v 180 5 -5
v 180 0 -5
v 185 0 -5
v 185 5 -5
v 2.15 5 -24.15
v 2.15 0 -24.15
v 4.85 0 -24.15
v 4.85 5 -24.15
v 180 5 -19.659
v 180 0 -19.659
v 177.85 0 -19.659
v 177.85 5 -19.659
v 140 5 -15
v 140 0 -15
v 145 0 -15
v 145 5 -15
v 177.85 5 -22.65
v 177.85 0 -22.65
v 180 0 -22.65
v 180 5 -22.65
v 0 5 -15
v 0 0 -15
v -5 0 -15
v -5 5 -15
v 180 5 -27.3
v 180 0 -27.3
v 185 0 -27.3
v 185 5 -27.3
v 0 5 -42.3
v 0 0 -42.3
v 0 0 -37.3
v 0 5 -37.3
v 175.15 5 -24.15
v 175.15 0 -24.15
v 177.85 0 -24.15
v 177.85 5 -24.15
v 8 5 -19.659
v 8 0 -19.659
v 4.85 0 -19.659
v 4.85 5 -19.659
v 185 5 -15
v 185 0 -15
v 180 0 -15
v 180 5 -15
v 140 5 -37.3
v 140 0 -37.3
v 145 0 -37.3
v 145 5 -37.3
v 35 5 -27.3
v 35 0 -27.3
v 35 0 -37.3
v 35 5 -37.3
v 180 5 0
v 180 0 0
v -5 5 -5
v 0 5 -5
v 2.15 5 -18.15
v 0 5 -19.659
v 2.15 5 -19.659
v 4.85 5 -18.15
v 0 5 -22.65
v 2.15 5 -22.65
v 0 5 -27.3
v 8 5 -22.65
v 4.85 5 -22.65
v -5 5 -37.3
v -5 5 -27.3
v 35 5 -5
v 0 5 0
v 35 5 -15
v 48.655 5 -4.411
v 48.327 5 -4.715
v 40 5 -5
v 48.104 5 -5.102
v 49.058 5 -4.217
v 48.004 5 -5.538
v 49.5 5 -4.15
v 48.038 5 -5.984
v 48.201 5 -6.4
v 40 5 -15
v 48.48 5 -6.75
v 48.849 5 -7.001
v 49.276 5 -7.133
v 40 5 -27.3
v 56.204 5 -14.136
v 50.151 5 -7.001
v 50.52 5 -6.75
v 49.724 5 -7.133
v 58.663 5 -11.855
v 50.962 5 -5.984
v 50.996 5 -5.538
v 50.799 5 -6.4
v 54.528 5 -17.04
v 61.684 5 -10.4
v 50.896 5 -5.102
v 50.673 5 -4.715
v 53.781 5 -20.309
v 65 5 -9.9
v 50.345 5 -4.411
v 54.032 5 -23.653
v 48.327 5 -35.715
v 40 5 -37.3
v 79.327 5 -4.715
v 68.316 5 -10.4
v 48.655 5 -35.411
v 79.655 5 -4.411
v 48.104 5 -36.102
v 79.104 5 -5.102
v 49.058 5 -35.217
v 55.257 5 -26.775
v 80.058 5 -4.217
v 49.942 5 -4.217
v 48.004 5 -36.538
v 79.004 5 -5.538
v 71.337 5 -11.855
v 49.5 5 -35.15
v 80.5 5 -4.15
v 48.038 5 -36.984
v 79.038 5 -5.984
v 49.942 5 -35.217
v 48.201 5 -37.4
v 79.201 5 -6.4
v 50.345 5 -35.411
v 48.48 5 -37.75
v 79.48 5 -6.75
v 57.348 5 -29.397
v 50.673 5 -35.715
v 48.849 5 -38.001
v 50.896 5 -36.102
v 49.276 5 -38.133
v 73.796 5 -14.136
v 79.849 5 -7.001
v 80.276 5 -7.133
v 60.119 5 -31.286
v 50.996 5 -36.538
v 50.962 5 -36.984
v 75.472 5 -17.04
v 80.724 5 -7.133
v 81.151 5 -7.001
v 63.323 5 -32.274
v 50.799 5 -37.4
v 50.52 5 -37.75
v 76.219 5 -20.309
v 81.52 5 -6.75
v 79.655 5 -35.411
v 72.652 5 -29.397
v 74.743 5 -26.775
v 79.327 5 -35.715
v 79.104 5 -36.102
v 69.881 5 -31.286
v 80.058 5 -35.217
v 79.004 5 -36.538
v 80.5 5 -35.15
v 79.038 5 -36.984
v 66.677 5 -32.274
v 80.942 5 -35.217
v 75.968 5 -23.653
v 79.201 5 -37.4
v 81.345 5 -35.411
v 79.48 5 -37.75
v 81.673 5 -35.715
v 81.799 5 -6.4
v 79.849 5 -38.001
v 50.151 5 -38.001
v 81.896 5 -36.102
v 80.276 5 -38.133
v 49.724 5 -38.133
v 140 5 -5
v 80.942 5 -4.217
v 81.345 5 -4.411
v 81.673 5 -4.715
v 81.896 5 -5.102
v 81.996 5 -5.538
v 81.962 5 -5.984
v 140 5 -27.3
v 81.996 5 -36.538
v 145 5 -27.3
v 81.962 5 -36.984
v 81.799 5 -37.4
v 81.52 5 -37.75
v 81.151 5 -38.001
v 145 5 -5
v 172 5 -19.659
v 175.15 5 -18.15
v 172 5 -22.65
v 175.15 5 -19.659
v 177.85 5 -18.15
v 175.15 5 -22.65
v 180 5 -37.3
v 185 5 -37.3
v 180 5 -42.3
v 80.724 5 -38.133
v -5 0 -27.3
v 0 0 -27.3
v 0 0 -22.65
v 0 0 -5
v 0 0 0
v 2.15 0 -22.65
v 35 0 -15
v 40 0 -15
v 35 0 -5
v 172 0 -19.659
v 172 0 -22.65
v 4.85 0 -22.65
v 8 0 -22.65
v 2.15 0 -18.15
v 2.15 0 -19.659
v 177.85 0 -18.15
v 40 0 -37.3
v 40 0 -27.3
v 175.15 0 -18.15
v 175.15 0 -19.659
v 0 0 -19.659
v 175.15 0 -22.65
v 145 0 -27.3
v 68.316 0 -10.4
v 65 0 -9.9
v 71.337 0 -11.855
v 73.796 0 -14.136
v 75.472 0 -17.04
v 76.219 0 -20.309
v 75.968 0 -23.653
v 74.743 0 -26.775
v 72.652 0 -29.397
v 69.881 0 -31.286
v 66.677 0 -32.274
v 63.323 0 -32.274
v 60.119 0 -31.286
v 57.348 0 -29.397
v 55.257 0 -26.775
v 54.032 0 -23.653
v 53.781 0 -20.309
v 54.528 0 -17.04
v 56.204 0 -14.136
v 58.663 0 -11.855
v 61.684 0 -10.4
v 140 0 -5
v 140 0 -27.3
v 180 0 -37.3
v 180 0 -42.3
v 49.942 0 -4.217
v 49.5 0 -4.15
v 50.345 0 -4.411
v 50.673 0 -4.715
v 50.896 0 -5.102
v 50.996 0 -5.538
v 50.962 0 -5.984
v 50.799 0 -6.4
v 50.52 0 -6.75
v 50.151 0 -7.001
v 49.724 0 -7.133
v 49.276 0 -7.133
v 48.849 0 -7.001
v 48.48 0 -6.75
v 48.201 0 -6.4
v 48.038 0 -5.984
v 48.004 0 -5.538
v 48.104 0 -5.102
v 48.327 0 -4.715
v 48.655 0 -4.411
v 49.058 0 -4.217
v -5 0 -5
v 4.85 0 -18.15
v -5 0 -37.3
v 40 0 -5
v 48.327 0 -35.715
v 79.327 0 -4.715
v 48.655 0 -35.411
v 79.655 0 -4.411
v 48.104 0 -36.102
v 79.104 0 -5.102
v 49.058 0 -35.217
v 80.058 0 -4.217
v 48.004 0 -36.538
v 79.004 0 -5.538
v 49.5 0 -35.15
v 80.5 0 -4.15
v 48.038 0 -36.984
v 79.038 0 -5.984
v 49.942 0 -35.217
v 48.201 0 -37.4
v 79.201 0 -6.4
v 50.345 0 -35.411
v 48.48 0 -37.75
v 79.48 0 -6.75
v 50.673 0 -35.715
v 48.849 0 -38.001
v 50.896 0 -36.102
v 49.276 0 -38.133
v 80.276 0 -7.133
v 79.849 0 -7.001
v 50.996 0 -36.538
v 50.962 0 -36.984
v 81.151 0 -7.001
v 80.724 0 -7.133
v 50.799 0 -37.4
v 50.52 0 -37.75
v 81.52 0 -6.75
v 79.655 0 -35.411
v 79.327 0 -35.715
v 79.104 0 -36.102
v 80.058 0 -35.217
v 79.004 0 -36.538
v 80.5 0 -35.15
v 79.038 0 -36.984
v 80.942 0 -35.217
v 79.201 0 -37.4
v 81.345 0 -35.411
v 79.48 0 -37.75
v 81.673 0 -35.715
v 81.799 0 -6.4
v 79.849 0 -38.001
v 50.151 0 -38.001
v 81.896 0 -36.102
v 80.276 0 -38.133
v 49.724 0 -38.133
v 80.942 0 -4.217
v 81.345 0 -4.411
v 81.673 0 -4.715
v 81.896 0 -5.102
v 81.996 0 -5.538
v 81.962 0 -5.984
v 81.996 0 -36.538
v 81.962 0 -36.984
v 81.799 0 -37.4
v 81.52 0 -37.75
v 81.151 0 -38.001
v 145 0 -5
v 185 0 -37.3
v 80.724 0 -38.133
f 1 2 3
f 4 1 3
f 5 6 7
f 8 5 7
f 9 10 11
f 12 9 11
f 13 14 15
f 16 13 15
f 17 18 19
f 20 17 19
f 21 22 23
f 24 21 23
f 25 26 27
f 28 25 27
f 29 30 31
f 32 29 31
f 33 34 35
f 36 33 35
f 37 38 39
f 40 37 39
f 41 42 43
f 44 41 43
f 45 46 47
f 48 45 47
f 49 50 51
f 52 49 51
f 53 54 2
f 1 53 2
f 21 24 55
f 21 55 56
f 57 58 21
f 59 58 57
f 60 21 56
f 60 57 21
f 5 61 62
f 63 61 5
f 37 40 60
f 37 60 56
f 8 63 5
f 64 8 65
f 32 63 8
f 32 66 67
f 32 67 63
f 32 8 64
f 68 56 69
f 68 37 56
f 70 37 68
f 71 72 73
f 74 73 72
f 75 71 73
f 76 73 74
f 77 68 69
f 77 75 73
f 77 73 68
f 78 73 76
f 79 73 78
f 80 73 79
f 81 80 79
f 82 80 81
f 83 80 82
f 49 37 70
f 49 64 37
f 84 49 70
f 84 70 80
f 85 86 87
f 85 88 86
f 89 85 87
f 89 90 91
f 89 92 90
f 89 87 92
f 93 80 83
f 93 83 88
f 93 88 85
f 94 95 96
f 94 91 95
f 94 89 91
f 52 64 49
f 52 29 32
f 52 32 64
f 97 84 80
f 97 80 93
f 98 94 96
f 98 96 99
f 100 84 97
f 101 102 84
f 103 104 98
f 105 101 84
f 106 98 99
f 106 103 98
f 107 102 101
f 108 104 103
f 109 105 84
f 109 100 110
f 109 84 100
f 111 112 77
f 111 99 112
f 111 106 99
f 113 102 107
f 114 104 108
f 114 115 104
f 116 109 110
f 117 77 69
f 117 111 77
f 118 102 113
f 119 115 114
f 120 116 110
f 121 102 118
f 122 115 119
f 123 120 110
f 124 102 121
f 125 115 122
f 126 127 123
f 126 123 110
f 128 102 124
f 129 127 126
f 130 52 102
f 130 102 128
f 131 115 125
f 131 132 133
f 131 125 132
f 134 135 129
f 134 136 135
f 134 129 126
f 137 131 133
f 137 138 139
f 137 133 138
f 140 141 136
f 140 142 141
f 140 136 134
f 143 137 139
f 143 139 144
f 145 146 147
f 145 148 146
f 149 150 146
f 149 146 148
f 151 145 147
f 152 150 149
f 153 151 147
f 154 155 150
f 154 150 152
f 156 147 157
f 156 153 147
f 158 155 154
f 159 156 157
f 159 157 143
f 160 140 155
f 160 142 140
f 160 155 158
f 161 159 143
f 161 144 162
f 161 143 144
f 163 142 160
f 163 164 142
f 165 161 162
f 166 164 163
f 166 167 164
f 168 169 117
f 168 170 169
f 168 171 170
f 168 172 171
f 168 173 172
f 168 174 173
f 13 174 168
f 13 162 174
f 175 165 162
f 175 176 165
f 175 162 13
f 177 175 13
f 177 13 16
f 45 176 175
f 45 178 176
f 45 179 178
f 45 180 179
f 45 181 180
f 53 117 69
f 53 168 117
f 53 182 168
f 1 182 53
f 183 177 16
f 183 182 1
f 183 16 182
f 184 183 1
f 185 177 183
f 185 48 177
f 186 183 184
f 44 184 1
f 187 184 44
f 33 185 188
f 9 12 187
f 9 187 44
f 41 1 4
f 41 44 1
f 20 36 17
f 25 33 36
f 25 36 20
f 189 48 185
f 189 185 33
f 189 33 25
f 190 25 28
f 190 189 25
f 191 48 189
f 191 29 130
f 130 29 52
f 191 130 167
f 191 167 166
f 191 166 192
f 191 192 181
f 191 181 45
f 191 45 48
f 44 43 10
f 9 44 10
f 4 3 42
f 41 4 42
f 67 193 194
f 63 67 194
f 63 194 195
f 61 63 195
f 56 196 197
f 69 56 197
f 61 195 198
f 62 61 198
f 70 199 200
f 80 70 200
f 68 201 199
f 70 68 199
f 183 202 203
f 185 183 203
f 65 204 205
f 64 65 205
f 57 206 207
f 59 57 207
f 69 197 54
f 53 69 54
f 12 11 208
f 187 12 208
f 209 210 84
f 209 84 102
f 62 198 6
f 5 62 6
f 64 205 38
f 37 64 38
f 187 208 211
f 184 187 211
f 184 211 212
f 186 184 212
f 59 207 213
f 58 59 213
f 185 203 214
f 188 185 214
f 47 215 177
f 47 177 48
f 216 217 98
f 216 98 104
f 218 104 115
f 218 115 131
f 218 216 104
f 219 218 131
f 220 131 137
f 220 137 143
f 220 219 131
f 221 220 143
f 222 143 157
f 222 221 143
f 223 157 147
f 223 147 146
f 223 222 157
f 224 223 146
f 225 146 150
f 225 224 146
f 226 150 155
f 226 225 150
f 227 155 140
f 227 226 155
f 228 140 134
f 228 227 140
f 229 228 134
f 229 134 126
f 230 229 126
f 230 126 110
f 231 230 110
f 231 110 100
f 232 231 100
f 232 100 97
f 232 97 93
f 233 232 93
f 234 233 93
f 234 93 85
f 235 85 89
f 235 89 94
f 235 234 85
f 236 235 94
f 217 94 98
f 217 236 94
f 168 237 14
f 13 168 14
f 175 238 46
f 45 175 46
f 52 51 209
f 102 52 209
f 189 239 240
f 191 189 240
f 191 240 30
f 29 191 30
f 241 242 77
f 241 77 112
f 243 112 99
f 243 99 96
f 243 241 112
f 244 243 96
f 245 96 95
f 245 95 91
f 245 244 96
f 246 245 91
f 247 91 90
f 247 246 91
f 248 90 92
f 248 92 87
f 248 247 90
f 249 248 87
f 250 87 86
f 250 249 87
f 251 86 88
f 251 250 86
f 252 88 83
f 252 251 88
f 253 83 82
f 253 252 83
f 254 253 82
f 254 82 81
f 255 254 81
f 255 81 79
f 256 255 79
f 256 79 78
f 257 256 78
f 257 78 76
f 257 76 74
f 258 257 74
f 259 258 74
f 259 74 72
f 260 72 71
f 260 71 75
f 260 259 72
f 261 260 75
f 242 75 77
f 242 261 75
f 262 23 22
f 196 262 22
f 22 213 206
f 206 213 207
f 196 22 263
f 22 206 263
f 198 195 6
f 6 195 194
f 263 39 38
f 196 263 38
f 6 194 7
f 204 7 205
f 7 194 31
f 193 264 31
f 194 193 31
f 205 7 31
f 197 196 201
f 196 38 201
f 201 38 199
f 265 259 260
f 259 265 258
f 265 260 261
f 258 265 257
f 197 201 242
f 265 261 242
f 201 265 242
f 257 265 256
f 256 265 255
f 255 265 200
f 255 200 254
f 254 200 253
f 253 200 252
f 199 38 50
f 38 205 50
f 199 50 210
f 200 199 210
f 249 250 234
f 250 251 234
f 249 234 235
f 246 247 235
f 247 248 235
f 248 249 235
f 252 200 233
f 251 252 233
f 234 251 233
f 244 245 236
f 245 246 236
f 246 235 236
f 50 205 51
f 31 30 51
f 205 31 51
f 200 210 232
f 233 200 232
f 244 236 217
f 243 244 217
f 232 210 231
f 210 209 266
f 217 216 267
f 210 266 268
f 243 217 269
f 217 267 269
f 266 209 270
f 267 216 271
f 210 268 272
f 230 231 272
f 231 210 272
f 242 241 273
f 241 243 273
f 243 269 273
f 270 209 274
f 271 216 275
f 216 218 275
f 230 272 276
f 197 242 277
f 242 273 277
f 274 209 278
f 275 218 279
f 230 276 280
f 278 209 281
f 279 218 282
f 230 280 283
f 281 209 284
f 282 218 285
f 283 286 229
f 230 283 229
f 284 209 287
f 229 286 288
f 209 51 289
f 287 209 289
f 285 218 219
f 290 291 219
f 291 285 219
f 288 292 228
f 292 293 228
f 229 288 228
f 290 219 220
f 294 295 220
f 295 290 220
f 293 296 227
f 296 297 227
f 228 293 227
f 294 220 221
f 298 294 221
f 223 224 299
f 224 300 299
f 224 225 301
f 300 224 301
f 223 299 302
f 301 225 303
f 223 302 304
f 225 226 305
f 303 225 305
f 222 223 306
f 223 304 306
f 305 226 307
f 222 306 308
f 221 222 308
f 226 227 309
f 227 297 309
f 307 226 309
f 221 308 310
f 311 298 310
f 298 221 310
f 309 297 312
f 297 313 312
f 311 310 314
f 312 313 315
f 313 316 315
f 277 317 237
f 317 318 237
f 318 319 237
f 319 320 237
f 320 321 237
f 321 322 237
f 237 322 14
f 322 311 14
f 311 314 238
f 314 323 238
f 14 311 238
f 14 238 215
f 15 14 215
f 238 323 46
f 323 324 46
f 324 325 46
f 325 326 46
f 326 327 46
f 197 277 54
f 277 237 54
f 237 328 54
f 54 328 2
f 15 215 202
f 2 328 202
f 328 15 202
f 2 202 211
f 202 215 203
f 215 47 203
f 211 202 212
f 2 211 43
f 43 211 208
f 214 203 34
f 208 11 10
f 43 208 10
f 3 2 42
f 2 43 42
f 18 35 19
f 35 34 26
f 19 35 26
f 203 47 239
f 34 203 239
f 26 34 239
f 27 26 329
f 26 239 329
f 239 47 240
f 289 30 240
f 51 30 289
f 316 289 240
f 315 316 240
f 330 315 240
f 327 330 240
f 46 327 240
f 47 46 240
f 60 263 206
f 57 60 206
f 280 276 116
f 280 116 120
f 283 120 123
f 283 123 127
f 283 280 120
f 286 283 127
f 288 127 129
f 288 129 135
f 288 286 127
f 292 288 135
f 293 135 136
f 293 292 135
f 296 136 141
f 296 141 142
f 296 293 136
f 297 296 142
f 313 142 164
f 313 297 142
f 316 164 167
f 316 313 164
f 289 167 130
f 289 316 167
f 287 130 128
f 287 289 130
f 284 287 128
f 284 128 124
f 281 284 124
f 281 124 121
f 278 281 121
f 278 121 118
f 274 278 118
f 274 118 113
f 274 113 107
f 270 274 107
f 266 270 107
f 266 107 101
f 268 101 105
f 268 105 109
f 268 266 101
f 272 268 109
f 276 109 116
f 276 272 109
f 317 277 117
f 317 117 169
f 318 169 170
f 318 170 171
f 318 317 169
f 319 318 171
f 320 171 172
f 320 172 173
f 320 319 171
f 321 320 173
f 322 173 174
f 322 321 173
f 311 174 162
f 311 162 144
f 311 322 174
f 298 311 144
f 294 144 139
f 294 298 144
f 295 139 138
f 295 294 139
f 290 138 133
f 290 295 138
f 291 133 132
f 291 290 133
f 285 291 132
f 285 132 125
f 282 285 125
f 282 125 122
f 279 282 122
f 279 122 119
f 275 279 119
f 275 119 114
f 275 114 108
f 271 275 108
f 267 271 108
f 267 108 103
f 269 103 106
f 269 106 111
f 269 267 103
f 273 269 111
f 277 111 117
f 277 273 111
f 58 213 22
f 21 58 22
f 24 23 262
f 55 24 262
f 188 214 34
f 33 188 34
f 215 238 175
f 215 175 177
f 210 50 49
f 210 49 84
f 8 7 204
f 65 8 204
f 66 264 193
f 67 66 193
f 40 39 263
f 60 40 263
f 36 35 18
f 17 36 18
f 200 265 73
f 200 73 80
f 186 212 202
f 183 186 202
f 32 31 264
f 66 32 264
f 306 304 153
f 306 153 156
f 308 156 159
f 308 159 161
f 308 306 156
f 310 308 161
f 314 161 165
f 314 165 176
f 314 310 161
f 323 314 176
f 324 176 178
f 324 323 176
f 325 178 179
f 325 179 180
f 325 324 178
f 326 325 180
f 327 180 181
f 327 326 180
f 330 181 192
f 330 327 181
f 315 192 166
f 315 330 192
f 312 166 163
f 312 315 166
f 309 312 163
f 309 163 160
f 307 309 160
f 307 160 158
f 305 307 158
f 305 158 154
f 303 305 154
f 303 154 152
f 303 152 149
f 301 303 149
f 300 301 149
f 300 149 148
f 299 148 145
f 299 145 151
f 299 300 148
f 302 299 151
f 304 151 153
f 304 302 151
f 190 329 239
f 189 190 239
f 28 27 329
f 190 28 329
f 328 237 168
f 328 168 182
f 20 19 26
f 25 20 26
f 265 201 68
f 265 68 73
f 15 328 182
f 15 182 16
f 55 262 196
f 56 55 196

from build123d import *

# Parameters (mm, degrees)
SKETCH_1_R      = 11.25
SKETCH_1_R_2    = 1.5
SKETCH_1_W      = 5
SKETCH_1_H      = 10
EXTRUDE_1_DEPTH = 5


with BuildPart() as part:
    # 草图1 → 凸台-拉伸1 (new body)
    with BuildSketch(Plane(origin=(0, 0, 0), x_dir=(1, 0, 0), z_dir=(0, 1, 0))):
        Polygon((0, 0), (180, 0), (180, 5), (185, 5), (185, 15), (180, 15), (180, 19.659044965), (177.85, 19.659044965), (177.85, 18.15), (175.15, 18.15), (175.15, 19.659044965), (172, 19.659044965), (172, 22.65), (175.15, 22.65), (175.15, 24.15), (177.85, 24.15), (177.85, 22.65), (180, 22.65), (180, 27.3), (185, 27.3), (185, 37.3), (180, 37.3), (180, 42.3), (99, 42.3), (81, 42.3), (0, 42.3), (0, 37.3), (-5, 37.3), (-5, 27.3), (0, 27.3), (0, 22.65), (2.15, 22.65), (2.15, 24.15), (4.85, 24.15), (4.85, 22.65), (8, 22.65), (8, 19.659044965), (4.85, 19.659044965), (4.85, 18.15), (2.15, 18.15), (2.15, 19.659044965), (0, 19.659044965), (0, 15), (-5, 15), (-5, 5), (0, 5), align=None)
        with Locations(Location((65, 21.15, 0), (0, 0, 270))):
            Circle(SKETCH_1_R, mode=Mode.SUBTRACT)
        with Locations(Location((49.5, 36.65, 0), (0, 0, 270))):
            Circle(SKETCH_1_R_2, mode=Mode.SUBTRACT)
        with Locations(Location((80.5, 36.65, 0), (0, 0, 270))):
            Circle(SKETCH_1_R_2, mode=Mode.SUBTRACT)
        with Locations(Location((80.5, 5.65, 0), (0, 0, 270))):
            Circle(SKETCH_1_R_2, mode=Mode.SUBTRACT)
        with Locations(Location((49.5, 5.65, 0), (0, 0, 270))):
            Circle(SKETCH_1_R_2, mode=Mode.SUBTRACT)
        with Locations((37.5, 32.3)):
            Rectangle(SKETCH_1_W, SKETCH_1_H, mode=Mode.SUBTRACT)
        with Locations((37.5, 10)):
            Rectangle(SKETCH_1_W, SKETCH_1_H, mode=Mode.SUBTRACT)
        with Locations((142.5, 32.3)):
            Rectangle(SKETCH_1_W, SKETCH_1_H, mode=Mode.SUBTRACT)
        with Locations((142.5, 10)):
            Rectangle(SKETCH_1_W, SKETCH_1_H, mode=Mode.SUBTRACT)
    extrude(amount=EXTRUDE_1_DEPTH)


solid = part.part
